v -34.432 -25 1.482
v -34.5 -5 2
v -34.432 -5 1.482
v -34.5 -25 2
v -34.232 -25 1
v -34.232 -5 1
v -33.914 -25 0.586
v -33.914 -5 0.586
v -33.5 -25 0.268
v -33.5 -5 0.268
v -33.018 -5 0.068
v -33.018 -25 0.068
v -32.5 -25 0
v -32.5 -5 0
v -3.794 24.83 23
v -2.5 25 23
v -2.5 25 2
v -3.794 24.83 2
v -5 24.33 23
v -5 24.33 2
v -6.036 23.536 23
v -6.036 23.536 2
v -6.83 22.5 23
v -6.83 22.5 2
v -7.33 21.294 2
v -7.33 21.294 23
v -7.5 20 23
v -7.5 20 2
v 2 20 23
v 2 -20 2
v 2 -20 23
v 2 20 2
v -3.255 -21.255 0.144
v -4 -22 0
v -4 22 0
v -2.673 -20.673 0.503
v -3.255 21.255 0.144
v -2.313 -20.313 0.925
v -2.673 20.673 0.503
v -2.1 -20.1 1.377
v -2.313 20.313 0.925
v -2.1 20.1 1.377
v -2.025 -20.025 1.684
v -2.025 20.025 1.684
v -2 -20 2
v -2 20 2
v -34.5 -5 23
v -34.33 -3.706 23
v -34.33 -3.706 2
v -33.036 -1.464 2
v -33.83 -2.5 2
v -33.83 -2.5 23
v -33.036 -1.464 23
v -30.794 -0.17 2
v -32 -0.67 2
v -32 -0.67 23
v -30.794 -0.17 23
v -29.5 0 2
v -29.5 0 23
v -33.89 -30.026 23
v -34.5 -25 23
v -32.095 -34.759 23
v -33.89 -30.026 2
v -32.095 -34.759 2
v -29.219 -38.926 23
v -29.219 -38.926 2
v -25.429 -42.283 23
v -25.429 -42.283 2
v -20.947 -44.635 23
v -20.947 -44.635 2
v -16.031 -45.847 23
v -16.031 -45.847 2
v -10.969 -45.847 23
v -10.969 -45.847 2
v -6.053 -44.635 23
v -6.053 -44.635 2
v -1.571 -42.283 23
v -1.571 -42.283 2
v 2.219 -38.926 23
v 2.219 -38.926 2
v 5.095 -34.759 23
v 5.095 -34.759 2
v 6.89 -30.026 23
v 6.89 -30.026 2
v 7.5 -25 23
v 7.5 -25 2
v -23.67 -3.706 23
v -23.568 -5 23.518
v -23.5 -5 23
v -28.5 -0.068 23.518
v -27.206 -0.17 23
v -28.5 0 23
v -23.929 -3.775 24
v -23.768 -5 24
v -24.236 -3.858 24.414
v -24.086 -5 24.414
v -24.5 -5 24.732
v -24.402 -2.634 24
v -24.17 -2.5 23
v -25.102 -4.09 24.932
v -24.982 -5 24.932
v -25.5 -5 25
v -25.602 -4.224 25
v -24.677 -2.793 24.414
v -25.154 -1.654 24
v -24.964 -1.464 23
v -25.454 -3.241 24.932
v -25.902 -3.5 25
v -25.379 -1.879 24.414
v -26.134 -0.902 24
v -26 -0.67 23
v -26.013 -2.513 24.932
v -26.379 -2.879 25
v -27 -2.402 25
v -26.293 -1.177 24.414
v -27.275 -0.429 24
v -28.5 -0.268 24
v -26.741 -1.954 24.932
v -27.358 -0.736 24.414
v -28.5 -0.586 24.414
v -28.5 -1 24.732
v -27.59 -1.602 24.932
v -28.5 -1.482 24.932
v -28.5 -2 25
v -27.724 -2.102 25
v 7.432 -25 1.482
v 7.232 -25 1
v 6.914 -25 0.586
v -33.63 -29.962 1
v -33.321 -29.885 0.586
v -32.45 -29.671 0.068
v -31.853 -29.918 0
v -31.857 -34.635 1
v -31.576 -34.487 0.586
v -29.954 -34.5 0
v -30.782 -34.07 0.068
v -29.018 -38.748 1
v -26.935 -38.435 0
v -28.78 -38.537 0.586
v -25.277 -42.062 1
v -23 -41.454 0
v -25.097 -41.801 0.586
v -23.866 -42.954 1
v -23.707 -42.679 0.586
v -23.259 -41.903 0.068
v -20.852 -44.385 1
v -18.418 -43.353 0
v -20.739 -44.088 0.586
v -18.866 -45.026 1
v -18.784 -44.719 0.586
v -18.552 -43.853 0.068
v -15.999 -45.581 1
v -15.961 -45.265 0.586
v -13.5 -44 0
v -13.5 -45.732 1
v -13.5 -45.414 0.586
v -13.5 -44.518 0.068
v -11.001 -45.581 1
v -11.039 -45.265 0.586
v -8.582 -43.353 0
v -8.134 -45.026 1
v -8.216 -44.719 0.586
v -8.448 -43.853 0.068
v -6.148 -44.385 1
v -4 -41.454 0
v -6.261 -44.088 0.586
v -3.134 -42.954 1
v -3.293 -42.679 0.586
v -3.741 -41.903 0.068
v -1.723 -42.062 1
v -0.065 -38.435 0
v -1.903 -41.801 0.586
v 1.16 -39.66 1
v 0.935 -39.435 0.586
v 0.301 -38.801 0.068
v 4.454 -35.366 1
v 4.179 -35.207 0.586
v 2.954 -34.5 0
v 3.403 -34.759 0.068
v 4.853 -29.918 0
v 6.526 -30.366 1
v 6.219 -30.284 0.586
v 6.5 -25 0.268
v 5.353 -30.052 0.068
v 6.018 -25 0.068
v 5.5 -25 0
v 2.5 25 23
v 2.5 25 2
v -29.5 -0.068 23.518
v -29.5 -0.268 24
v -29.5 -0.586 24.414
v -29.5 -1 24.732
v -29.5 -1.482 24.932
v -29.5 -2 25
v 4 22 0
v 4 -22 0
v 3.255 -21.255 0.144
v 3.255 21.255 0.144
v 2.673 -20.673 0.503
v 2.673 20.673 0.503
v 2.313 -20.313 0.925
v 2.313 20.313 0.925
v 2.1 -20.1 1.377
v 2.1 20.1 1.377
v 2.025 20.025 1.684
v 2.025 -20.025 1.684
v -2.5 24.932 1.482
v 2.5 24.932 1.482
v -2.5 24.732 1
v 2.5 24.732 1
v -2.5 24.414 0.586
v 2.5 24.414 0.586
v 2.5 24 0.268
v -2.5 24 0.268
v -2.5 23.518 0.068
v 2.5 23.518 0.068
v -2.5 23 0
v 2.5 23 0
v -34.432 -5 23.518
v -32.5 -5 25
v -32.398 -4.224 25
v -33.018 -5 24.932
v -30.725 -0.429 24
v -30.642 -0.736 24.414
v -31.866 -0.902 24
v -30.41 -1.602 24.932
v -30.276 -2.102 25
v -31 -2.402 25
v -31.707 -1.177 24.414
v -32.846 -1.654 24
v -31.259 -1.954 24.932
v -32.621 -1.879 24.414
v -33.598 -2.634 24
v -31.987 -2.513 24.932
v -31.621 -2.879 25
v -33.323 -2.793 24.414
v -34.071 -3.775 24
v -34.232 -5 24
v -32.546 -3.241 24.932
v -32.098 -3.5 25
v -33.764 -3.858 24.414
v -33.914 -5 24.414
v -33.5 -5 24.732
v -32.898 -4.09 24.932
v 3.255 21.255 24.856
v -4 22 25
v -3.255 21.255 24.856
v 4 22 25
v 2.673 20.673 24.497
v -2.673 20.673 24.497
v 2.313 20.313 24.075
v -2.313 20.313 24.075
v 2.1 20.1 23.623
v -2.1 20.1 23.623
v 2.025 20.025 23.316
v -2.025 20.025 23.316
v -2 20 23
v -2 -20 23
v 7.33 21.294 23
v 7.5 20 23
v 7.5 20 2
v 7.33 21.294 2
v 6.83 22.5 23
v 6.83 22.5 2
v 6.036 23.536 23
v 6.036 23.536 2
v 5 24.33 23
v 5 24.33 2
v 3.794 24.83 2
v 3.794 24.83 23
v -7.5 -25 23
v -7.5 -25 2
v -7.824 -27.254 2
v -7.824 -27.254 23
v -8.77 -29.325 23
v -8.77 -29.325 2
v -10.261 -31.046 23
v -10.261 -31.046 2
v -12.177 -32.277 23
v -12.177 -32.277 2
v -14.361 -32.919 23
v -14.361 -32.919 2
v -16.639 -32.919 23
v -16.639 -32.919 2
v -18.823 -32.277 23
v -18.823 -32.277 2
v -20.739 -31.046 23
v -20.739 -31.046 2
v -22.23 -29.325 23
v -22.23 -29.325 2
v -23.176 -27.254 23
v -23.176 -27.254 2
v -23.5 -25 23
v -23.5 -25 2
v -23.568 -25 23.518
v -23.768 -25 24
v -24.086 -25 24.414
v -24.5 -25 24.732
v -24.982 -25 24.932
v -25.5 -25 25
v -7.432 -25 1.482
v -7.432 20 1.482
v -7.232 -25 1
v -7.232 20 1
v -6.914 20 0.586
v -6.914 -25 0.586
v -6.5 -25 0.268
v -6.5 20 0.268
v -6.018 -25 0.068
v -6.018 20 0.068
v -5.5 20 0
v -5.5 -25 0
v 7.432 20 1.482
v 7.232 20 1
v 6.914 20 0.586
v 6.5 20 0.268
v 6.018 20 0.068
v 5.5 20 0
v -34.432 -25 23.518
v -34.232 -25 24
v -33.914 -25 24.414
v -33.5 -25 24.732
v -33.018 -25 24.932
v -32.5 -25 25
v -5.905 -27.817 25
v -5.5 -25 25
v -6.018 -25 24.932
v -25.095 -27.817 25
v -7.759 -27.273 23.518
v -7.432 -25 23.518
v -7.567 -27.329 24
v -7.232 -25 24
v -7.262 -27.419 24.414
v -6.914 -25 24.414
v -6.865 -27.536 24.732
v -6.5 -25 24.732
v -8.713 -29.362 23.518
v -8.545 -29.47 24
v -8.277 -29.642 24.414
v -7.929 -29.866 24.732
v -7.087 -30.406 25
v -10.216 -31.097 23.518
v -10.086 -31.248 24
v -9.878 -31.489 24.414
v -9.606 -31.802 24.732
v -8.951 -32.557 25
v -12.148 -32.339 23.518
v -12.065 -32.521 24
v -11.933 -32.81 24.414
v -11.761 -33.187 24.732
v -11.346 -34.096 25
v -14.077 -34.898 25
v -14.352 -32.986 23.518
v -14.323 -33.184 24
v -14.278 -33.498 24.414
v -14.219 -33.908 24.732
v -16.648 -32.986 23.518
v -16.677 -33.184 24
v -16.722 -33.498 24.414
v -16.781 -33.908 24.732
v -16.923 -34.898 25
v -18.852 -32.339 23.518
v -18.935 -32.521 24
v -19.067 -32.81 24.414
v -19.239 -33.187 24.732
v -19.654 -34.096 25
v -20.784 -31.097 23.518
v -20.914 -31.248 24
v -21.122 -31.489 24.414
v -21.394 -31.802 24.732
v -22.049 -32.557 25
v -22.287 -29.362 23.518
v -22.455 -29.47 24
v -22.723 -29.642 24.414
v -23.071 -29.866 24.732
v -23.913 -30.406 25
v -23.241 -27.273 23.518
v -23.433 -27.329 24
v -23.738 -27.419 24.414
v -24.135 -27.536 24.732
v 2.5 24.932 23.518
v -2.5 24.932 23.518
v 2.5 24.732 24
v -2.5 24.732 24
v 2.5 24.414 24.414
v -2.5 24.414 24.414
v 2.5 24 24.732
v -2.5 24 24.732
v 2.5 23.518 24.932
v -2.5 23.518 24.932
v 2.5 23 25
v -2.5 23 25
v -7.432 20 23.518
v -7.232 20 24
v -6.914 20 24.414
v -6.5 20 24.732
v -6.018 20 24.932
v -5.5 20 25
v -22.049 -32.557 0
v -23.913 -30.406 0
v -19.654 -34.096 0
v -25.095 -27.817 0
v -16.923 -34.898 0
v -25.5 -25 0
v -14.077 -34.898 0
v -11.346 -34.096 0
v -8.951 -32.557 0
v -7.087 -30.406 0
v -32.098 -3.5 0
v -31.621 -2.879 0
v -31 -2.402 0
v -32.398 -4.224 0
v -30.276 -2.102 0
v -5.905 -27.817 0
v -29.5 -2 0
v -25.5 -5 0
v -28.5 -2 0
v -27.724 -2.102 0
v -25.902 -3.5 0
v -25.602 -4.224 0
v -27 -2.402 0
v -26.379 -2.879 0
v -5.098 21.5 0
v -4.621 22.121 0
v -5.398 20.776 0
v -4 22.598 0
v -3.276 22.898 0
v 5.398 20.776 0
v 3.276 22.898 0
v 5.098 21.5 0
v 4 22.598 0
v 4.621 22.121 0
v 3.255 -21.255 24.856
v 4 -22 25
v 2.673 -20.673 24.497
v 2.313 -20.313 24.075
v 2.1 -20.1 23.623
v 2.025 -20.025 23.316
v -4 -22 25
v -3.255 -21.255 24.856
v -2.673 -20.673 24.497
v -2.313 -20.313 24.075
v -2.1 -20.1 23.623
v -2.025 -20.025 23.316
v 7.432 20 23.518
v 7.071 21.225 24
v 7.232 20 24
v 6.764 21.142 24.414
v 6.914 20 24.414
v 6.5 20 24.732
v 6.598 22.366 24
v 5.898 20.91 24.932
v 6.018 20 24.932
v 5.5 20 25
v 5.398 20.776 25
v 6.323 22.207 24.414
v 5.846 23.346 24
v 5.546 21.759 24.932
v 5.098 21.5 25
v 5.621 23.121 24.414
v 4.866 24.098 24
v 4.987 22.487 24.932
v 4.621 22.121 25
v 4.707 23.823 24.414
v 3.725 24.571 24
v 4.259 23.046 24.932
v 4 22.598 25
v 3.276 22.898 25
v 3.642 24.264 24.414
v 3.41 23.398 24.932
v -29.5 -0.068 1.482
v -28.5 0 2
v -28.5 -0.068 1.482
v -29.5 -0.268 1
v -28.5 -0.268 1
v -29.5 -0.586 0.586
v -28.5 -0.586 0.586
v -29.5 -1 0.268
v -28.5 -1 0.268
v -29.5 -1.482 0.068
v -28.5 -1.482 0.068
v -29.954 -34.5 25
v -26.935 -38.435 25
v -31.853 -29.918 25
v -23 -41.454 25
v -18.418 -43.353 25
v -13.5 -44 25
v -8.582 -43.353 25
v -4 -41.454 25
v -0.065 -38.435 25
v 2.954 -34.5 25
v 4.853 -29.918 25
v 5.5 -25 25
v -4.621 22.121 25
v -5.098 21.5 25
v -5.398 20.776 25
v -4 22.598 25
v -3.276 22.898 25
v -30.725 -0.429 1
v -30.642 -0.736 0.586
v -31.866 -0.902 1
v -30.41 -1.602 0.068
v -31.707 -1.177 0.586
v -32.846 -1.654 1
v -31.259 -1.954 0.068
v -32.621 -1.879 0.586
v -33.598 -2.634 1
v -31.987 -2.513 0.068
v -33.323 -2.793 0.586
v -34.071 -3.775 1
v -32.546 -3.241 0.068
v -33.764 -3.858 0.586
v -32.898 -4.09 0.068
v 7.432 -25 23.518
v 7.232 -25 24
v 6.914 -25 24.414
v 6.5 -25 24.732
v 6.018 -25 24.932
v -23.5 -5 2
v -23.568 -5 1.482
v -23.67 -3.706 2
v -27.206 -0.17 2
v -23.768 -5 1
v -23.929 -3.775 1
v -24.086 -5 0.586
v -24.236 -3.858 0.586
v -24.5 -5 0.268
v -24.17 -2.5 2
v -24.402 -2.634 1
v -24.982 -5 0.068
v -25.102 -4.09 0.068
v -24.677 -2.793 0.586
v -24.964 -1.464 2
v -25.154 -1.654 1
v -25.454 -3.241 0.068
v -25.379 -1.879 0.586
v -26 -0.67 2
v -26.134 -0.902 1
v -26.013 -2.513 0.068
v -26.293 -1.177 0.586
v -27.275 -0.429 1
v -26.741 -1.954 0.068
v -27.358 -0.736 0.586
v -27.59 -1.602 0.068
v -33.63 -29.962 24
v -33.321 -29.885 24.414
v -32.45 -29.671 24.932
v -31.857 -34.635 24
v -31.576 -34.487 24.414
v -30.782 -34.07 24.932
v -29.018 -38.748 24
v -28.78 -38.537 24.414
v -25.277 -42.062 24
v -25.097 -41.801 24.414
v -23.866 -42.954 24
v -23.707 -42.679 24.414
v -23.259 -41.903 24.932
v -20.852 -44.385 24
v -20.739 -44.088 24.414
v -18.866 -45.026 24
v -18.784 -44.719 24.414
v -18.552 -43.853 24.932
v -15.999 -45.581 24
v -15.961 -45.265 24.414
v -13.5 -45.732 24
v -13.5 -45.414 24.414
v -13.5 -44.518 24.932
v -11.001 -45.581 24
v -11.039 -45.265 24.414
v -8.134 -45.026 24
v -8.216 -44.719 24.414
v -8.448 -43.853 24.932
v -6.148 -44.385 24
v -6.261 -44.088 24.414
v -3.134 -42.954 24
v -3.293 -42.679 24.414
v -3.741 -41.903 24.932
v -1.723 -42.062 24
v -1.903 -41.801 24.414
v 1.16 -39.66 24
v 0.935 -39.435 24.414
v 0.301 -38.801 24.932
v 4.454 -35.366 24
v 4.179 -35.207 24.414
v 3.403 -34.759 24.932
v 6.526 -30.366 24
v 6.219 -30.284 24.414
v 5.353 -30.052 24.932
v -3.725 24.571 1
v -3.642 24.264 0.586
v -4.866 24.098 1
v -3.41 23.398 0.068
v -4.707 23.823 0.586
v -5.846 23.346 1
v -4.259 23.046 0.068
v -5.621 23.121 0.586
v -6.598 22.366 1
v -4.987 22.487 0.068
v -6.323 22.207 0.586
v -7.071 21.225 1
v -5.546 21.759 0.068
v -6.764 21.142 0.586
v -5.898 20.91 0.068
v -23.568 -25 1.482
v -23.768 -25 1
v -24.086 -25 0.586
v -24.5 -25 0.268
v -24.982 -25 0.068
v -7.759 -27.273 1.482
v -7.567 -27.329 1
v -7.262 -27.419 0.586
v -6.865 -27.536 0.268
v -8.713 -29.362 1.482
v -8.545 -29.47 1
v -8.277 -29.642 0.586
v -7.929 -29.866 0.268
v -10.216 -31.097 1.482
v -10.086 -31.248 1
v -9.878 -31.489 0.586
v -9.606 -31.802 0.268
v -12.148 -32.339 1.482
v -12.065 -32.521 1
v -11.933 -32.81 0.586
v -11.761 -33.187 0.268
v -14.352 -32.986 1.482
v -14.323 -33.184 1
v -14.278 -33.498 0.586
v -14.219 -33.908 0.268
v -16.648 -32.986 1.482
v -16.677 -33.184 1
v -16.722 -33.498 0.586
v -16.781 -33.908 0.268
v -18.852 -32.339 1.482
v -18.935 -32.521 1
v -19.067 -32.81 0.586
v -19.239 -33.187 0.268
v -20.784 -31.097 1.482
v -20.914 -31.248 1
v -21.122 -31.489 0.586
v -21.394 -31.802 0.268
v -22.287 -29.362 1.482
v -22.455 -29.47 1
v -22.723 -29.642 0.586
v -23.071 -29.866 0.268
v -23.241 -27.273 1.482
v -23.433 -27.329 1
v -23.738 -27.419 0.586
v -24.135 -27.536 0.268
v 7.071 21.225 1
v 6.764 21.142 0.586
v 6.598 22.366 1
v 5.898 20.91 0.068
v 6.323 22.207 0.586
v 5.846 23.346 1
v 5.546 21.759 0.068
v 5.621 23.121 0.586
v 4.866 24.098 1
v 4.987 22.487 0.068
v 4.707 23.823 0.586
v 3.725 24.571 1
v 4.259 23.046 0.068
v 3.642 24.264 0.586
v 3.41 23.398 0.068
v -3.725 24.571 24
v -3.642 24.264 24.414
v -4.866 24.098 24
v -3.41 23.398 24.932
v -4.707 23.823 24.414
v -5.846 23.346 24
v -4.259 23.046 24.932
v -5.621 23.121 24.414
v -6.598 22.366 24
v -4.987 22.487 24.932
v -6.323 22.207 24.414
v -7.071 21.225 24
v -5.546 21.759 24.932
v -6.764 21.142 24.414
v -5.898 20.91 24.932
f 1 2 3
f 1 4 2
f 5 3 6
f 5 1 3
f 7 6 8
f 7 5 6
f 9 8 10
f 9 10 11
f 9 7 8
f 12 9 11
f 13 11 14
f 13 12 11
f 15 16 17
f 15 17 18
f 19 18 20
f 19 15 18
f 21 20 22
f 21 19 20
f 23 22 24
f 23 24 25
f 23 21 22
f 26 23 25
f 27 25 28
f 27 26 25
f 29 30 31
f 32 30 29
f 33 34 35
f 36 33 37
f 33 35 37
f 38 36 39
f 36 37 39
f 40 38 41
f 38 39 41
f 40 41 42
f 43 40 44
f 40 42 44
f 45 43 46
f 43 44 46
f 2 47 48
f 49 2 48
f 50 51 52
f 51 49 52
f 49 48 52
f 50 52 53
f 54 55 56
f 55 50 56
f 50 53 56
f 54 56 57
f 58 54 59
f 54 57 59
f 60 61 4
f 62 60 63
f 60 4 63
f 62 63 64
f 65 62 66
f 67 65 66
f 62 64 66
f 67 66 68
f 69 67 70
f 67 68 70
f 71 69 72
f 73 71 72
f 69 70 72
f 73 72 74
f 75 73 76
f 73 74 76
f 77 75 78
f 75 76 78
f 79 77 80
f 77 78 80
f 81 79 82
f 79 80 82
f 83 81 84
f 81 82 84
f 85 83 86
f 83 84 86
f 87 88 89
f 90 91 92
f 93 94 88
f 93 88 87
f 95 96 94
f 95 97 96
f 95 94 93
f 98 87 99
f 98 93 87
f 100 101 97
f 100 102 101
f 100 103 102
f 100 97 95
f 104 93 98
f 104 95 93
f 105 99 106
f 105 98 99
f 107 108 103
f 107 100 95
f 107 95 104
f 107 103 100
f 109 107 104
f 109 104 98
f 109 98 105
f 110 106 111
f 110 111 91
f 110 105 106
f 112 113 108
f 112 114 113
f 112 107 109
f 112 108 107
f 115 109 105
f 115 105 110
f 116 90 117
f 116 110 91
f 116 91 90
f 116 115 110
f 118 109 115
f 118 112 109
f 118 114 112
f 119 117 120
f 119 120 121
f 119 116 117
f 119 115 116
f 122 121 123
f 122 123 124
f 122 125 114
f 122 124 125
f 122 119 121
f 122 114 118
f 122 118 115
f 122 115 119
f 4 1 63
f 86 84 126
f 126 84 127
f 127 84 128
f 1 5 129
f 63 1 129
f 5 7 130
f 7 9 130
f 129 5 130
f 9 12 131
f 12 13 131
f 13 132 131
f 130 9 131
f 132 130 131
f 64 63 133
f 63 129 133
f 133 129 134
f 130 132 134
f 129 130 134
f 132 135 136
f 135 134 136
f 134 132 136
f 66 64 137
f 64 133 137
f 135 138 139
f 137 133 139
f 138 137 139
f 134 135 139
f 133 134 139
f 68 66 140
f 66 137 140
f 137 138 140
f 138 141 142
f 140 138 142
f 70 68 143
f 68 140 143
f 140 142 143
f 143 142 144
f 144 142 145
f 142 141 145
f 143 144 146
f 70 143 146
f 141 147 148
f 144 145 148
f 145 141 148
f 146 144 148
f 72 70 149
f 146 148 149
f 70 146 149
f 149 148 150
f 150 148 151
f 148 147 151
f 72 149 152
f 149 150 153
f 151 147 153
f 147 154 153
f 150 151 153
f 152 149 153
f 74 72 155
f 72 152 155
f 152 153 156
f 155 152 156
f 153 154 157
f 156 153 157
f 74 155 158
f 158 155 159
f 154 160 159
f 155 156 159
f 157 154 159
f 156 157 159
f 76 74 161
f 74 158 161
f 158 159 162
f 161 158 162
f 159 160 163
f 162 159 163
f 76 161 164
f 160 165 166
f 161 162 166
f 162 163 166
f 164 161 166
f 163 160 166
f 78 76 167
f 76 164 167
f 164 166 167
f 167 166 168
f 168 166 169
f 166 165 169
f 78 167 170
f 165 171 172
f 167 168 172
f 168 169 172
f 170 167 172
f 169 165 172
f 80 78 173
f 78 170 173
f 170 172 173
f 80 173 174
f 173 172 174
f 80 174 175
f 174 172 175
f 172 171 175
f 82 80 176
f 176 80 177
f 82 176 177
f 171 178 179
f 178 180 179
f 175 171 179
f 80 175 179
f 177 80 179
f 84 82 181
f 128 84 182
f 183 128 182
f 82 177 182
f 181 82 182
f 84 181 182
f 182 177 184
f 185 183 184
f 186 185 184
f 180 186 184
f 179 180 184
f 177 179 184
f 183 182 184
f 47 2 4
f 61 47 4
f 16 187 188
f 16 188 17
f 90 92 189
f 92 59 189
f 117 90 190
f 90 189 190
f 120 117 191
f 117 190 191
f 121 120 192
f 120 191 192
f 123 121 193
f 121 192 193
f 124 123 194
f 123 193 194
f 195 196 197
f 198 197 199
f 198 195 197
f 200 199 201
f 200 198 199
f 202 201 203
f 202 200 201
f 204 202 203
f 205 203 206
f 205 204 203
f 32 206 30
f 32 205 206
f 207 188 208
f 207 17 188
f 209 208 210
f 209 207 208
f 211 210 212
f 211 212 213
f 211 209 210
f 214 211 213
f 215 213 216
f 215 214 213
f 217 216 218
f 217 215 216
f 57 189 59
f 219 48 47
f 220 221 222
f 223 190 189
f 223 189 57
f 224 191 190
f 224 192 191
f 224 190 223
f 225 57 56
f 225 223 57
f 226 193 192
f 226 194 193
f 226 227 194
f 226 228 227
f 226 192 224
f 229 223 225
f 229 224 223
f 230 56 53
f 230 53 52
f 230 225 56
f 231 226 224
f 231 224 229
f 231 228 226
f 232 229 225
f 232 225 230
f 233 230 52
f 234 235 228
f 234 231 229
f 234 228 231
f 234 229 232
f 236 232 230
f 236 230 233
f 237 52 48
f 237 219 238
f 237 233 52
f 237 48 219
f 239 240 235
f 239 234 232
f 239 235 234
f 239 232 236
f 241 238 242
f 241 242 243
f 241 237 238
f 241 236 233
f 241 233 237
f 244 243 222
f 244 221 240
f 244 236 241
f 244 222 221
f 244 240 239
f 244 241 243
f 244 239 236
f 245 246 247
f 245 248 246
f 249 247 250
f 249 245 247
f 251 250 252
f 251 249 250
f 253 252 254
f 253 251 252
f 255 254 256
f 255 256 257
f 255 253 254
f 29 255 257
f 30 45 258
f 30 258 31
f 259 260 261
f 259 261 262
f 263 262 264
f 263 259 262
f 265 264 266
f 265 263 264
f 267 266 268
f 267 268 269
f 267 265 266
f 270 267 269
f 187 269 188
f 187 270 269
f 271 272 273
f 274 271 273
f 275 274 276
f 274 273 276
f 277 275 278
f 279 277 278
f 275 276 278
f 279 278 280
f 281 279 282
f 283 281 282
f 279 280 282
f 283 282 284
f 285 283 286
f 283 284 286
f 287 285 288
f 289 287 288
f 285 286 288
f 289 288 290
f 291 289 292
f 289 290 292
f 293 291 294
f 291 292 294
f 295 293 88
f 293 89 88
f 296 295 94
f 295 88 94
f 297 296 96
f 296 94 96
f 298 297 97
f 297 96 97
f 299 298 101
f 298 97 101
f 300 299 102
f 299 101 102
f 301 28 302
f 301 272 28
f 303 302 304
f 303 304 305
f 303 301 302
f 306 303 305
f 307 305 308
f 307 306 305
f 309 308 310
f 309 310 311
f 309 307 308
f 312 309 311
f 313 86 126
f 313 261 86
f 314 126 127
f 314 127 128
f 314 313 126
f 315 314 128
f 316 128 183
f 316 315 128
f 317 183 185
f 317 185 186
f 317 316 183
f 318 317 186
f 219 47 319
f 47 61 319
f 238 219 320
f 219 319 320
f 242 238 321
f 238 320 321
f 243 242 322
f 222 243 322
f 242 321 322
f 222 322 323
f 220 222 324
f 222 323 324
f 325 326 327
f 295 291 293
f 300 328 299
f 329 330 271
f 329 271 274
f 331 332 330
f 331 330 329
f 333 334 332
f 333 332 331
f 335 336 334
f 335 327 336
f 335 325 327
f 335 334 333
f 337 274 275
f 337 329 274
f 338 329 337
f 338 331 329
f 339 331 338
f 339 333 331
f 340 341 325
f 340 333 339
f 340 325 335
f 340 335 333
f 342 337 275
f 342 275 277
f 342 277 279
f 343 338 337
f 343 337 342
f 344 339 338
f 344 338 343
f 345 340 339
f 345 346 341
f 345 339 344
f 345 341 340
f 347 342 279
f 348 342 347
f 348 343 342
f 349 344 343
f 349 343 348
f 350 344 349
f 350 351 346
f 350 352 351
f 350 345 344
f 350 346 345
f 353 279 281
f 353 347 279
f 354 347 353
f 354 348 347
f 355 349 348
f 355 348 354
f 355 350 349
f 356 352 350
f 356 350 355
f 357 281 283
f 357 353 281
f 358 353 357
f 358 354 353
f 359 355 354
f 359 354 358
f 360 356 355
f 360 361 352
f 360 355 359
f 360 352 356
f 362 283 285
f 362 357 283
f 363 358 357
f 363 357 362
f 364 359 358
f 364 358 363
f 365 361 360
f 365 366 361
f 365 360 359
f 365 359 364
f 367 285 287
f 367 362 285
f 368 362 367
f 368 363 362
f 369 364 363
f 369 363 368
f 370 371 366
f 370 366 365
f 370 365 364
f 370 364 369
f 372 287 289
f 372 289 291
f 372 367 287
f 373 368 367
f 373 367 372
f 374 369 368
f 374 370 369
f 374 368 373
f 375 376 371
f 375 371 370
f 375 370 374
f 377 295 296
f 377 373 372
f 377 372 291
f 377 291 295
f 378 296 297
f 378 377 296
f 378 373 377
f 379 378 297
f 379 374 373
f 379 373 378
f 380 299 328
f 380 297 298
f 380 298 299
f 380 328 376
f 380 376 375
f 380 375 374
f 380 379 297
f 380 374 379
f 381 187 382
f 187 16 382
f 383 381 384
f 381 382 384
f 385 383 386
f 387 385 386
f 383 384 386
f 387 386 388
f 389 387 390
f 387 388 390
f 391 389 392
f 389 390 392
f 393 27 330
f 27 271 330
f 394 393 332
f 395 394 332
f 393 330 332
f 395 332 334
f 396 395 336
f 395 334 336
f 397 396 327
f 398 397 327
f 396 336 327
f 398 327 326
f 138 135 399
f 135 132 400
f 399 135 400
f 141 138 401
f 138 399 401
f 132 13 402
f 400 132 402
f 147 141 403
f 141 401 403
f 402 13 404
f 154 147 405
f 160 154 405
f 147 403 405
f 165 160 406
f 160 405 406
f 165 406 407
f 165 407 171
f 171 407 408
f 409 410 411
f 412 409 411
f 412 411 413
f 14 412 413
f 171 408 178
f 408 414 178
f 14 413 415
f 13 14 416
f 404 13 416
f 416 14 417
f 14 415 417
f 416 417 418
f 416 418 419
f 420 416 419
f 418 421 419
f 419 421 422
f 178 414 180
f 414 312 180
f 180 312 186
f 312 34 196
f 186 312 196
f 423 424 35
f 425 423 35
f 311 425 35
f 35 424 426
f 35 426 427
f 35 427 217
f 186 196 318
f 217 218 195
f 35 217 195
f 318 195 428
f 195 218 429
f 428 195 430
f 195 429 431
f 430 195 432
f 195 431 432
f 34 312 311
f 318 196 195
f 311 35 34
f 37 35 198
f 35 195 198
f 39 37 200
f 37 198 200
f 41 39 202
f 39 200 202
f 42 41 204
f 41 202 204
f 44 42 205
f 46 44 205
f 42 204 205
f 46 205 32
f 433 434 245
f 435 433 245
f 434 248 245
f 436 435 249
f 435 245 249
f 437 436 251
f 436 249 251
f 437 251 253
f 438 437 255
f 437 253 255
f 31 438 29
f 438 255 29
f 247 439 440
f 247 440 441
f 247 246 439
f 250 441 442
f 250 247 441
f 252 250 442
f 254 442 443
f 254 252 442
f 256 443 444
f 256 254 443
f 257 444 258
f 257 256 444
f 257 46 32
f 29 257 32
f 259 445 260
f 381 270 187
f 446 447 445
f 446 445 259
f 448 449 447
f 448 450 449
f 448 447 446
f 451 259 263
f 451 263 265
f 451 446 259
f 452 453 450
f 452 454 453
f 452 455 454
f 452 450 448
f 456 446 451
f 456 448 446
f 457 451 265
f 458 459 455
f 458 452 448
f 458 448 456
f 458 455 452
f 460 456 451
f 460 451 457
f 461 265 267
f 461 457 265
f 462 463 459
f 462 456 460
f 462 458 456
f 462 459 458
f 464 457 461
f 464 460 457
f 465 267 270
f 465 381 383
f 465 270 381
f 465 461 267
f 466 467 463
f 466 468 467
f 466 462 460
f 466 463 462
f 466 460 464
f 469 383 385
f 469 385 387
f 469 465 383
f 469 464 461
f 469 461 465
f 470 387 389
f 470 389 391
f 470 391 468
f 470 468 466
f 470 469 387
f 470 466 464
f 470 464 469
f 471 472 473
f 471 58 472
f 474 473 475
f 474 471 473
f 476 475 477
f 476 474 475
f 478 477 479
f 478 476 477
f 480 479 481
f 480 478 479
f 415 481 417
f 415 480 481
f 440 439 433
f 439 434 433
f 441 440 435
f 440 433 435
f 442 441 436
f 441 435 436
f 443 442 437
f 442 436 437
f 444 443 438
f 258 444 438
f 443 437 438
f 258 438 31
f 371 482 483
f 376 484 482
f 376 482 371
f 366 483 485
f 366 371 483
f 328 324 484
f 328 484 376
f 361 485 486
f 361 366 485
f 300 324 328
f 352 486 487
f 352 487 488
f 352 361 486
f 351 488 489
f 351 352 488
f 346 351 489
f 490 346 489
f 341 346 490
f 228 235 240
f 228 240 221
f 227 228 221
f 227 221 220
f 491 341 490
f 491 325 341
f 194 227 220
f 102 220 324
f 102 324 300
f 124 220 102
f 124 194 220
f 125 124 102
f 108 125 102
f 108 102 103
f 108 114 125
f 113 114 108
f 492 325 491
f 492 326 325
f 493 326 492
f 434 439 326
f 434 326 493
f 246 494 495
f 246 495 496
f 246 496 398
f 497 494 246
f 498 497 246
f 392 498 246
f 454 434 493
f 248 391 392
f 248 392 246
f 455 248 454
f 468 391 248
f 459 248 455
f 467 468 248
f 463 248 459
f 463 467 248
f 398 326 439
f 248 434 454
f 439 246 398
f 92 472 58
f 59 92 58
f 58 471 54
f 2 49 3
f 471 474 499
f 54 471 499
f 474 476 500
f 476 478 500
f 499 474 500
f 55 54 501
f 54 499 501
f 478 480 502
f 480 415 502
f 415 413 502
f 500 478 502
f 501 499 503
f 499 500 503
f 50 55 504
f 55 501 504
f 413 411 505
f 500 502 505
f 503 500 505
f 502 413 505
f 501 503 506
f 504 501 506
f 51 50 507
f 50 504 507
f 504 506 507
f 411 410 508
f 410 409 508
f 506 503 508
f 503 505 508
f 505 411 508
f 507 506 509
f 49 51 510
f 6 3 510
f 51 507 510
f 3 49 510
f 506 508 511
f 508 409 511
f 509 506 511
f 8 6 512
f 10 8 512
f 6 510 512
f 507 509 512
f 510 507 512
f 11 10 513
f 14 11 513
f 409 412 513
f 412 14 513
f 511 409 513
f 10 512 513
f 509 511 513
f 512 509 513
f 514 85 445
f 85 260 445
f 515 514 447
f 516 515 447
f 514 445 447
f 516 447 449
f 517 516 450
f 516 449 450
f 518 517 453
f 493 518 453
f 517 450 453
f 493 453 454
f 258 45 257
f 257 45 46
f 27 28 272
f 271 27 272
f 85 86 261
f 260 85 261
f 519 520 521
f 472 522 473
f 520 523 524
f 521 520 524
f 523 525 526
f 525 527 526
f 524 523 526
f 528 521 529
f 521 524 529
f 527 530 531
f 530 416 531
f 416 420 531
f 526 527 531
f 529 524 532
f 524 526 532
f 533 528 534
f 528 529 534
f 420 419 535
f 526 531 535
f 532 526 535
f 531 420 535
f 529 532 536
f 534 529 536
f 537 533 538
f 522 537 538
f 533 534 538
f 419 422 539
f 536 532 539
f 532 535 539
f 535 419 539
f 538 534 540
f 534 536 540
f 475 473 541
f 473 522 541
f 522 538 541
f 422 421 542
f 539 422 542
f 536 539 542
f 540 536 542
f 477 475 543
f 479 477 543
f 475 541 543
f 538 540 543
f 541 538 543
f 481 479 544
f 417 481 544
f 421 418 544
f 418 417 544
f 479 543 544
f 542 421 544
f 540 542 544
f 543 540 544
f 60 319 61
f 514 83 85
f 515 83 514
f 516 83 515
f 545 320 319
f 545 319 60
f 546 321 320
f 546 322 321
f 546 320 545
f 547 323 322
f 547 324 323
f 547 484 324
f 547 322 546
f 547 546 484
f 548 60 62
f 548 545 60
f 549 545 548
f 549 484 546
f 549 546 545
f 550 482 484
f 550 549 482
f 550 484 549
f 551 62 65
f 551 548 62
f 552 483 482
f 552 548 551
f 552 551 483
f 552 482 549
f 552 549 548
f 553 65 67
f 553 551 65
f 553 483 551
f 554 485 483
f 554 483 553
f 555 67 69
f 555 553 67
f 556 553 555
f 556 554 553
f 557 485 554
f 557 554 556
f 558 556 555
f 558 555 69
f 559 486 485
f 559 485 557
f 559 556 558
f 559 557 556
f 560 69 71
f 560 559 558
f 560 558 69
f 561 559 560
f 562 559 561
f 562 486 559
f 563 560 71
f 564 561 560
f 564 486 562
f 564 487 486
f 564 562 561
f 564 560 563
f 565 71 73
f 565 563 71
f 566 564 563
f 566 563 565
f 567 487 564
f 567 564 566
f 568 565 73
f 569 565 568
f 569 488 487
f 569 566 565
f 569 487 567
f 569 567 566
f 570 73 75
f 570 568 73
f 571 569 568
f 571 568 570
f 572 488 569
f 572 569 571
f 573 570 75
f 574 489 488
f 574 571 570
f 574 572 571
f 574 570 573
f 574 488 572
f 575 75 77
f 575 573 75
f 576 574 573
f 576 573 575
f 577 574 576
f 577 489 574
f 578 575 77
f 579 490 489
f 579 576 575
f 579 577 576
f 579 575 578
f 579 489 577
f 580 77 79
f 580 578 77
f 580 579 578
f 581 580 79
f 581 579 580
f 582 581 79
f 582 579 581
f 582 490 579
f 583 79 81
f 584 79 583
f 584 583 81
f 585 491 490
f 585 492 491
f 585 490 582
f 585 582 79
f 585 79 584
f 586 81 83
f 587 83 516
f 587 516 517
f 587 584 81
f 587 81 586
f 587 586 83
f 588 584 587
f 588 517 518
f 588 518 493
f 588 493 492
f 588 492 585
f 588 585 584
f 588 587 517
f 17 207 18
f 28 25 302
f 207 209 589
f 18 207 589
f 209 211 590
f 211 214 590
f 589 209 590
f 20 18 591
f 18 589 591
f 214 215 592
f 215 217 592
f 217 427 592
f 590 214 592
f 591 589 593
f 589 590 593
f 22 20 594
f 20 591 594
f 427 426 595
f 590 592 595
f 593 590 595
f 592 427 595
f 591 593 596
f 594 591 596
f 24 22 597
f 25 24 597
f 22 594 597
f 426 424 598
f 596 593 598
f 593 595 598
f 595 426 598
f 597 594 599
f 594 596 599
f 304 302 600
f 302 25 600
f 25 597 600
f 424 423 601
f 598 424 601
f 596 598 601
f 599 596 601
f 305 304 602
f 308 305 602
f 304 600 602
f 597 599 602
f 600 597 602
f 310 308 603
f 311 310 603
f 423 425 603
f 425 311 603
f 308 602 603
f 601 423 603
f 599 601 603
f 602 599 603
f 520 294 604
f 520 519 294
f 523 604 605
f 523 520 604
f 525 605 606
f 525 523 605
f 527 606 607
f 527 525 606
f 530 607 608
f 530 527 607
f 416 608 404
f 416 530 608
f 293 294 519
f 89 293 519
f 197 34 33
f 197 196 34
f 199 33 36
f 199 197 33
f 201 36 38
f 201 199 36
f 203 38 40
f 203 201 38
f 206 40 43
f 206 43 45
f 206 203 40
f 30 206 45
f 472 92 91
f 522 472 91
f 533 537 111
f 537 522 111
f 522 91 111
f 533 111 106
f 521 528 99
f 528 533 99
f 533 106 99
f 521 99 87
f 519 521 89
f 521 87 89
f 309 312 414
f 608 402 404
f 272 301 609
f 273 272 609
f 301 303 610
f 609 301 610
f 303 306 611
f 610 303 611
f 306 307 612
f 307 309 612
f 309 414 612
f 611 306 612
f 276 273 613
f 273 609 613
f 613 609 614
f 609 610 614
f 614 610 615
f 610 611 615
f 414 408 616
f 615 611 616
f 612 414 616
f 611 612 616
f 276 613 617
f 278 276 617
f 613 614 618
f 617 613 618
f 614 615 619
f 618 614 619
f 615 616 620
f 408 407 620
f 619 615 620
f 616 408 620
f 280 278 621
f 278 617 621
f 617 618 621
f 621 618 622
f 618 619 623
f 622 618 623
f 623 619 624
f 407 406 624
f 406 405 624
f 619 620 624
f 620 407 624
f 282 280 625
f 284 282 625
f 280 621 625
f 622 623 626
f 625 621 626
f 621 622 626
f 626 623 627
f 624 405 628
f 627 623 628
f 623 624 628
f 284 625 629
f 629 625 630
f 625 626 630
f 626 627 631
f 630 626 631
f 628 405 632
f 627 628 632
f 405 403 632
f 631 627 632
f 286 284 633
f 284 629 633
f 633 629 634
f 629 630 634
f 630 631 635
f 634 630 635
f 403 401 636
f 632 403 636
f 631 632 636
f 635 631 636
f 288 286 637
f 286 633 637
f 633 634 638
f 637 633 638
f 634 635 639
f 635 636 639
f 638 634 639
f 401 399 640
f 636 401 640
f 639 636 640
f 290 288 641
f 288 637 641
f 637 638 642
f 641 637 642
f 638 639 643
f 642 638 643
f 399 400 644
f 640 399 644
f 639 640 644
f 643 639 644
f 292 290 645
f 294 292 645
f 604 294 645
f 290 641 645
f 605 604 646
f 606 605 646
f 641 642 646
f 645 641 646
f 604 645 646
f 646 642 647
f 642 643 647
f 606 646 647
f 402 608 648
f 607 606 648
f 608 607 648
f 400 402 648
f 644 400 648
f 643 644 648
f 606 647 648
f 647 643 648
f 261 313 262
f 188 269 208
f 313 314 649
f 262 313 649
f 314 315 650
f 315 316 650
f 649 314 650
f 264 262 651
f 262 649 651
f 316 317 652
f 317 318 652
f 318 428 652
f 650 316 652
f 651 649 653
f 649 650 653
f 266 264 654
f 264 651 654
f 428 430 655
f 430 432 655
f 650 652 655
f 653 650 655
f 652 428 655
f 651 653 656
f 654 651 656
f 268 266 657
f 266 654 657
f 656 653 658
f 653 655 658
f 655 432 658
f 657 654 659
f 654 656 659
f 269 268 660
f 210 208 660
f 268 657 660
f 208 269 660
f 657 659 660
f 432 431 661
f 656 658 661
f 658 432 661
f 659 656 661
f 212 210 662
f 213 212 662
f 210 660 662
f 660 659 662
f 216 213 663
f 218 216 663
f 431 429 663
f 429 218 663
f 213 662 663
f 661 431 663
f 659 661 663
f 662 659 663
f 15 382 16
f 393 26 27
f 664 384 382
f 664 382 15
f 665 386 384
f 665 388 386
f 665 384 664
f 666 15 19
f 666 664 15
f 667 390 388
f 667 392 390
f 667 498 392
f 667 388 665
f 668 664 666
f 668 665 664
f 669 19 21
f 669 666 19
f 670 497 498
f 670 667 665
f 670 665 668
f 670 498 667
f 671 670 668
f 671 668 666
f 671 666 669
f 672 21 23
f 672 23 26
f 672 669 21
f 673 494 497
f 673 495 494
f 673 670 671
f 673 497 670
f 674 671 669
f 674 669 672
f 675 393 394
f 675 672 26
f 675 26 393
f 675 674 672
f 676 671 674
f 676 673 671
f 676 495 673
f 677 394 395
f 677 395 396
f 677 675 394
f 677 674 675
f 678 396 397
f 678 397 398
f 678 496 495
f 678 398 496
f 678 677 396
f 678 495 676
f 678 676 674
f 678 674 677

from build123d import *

# Parameters (mm, degrees)
F0_W     = 4
F0_H     = 40
F1_DEPTH = 25
F2_R     = 5
F3_R     = 2


with BuildPart() as f1:
    # F0 (on Top) → F1 (new body)
    with BuildSketch(Plane.XY):
        with BuildLine():
            Line((7.5, -25), (7.5, 25))
            Line((7.5, 25), (-7.5, 25))
            Line((-7.5, 25), (-7.5, -25))
            ThreePointArc((-7.5, -25), (-15.5, -33), (-23.5, -25))
            Line((-23.5, -25), (-23.5, 0))
            Line((-23.5, 0), (-34.5, 0))
            Line((-34.5, 0), (-34.5, -25))
            ThreePointArc((-34.5, -25), (-13.5, -46), (7.5, -25))
        make_face()
        Rectangle(F0_W, F0_H, mode=Mode.SUBTRACT)
    extrude(amount=F1_DEPTH)

    # F2
    f2_edges = [f1.edges().sort_by_distance(p)[0] for p in [
        (-7.5, 25, 12.5),
        (7.5, 25, 12.5),
        (-23.5, 0, 12.5),
        (-34.5, 0, 12.5),
    ]]
    fillet(f2_edges, radius=F2_R)

    # F3
    f3_edges = [f1.edges().sort_by_distance(p)[0] for p in [
        (7.5, -2.5, 25),
        (6.035534, 23.535534, 25),
        (-13.5, -46, 25),
        (0, 25, 25),
        (-34.5, -15, 25),
        (-6.035534, 23.535534, 25),
        (-33.035534, -1.464466, 25),
        (-7.5, -2.5, 25),
        (-29, 0, 25),
        (-15.5, -33, 25),
        (-24.964466, -1.464466, 25),
        (-23.5, -15, 25),
        (2, 0, 25),
        (0, -20, 25),
        (-2, 0, 25),
        (0, 20, 25),
        (7.5, -2.5, 0),
        (6.035534, 23.535534, 0),
        (-13.5, -46, 0),
        (0, 25, 0),
        (-34.5, -15, 0),
        (-6.035534, 23.535534, 0),
        (-33.035534, -1.464466, 0),
        (-7.5, -2.5, 0),
        (-29, 0, 0),
        (-15.5, -33, 0),
        (-24.964466, -1.464466, 0),
        (-23.5, -15, 0),
        (2, 0, 0),
        (0, -20, 0),
        (-2, 0, 0),
        (0, 20, 0),
    ]]
    fillet(f3_edges, radius=F3_R)


solid = f1.part
